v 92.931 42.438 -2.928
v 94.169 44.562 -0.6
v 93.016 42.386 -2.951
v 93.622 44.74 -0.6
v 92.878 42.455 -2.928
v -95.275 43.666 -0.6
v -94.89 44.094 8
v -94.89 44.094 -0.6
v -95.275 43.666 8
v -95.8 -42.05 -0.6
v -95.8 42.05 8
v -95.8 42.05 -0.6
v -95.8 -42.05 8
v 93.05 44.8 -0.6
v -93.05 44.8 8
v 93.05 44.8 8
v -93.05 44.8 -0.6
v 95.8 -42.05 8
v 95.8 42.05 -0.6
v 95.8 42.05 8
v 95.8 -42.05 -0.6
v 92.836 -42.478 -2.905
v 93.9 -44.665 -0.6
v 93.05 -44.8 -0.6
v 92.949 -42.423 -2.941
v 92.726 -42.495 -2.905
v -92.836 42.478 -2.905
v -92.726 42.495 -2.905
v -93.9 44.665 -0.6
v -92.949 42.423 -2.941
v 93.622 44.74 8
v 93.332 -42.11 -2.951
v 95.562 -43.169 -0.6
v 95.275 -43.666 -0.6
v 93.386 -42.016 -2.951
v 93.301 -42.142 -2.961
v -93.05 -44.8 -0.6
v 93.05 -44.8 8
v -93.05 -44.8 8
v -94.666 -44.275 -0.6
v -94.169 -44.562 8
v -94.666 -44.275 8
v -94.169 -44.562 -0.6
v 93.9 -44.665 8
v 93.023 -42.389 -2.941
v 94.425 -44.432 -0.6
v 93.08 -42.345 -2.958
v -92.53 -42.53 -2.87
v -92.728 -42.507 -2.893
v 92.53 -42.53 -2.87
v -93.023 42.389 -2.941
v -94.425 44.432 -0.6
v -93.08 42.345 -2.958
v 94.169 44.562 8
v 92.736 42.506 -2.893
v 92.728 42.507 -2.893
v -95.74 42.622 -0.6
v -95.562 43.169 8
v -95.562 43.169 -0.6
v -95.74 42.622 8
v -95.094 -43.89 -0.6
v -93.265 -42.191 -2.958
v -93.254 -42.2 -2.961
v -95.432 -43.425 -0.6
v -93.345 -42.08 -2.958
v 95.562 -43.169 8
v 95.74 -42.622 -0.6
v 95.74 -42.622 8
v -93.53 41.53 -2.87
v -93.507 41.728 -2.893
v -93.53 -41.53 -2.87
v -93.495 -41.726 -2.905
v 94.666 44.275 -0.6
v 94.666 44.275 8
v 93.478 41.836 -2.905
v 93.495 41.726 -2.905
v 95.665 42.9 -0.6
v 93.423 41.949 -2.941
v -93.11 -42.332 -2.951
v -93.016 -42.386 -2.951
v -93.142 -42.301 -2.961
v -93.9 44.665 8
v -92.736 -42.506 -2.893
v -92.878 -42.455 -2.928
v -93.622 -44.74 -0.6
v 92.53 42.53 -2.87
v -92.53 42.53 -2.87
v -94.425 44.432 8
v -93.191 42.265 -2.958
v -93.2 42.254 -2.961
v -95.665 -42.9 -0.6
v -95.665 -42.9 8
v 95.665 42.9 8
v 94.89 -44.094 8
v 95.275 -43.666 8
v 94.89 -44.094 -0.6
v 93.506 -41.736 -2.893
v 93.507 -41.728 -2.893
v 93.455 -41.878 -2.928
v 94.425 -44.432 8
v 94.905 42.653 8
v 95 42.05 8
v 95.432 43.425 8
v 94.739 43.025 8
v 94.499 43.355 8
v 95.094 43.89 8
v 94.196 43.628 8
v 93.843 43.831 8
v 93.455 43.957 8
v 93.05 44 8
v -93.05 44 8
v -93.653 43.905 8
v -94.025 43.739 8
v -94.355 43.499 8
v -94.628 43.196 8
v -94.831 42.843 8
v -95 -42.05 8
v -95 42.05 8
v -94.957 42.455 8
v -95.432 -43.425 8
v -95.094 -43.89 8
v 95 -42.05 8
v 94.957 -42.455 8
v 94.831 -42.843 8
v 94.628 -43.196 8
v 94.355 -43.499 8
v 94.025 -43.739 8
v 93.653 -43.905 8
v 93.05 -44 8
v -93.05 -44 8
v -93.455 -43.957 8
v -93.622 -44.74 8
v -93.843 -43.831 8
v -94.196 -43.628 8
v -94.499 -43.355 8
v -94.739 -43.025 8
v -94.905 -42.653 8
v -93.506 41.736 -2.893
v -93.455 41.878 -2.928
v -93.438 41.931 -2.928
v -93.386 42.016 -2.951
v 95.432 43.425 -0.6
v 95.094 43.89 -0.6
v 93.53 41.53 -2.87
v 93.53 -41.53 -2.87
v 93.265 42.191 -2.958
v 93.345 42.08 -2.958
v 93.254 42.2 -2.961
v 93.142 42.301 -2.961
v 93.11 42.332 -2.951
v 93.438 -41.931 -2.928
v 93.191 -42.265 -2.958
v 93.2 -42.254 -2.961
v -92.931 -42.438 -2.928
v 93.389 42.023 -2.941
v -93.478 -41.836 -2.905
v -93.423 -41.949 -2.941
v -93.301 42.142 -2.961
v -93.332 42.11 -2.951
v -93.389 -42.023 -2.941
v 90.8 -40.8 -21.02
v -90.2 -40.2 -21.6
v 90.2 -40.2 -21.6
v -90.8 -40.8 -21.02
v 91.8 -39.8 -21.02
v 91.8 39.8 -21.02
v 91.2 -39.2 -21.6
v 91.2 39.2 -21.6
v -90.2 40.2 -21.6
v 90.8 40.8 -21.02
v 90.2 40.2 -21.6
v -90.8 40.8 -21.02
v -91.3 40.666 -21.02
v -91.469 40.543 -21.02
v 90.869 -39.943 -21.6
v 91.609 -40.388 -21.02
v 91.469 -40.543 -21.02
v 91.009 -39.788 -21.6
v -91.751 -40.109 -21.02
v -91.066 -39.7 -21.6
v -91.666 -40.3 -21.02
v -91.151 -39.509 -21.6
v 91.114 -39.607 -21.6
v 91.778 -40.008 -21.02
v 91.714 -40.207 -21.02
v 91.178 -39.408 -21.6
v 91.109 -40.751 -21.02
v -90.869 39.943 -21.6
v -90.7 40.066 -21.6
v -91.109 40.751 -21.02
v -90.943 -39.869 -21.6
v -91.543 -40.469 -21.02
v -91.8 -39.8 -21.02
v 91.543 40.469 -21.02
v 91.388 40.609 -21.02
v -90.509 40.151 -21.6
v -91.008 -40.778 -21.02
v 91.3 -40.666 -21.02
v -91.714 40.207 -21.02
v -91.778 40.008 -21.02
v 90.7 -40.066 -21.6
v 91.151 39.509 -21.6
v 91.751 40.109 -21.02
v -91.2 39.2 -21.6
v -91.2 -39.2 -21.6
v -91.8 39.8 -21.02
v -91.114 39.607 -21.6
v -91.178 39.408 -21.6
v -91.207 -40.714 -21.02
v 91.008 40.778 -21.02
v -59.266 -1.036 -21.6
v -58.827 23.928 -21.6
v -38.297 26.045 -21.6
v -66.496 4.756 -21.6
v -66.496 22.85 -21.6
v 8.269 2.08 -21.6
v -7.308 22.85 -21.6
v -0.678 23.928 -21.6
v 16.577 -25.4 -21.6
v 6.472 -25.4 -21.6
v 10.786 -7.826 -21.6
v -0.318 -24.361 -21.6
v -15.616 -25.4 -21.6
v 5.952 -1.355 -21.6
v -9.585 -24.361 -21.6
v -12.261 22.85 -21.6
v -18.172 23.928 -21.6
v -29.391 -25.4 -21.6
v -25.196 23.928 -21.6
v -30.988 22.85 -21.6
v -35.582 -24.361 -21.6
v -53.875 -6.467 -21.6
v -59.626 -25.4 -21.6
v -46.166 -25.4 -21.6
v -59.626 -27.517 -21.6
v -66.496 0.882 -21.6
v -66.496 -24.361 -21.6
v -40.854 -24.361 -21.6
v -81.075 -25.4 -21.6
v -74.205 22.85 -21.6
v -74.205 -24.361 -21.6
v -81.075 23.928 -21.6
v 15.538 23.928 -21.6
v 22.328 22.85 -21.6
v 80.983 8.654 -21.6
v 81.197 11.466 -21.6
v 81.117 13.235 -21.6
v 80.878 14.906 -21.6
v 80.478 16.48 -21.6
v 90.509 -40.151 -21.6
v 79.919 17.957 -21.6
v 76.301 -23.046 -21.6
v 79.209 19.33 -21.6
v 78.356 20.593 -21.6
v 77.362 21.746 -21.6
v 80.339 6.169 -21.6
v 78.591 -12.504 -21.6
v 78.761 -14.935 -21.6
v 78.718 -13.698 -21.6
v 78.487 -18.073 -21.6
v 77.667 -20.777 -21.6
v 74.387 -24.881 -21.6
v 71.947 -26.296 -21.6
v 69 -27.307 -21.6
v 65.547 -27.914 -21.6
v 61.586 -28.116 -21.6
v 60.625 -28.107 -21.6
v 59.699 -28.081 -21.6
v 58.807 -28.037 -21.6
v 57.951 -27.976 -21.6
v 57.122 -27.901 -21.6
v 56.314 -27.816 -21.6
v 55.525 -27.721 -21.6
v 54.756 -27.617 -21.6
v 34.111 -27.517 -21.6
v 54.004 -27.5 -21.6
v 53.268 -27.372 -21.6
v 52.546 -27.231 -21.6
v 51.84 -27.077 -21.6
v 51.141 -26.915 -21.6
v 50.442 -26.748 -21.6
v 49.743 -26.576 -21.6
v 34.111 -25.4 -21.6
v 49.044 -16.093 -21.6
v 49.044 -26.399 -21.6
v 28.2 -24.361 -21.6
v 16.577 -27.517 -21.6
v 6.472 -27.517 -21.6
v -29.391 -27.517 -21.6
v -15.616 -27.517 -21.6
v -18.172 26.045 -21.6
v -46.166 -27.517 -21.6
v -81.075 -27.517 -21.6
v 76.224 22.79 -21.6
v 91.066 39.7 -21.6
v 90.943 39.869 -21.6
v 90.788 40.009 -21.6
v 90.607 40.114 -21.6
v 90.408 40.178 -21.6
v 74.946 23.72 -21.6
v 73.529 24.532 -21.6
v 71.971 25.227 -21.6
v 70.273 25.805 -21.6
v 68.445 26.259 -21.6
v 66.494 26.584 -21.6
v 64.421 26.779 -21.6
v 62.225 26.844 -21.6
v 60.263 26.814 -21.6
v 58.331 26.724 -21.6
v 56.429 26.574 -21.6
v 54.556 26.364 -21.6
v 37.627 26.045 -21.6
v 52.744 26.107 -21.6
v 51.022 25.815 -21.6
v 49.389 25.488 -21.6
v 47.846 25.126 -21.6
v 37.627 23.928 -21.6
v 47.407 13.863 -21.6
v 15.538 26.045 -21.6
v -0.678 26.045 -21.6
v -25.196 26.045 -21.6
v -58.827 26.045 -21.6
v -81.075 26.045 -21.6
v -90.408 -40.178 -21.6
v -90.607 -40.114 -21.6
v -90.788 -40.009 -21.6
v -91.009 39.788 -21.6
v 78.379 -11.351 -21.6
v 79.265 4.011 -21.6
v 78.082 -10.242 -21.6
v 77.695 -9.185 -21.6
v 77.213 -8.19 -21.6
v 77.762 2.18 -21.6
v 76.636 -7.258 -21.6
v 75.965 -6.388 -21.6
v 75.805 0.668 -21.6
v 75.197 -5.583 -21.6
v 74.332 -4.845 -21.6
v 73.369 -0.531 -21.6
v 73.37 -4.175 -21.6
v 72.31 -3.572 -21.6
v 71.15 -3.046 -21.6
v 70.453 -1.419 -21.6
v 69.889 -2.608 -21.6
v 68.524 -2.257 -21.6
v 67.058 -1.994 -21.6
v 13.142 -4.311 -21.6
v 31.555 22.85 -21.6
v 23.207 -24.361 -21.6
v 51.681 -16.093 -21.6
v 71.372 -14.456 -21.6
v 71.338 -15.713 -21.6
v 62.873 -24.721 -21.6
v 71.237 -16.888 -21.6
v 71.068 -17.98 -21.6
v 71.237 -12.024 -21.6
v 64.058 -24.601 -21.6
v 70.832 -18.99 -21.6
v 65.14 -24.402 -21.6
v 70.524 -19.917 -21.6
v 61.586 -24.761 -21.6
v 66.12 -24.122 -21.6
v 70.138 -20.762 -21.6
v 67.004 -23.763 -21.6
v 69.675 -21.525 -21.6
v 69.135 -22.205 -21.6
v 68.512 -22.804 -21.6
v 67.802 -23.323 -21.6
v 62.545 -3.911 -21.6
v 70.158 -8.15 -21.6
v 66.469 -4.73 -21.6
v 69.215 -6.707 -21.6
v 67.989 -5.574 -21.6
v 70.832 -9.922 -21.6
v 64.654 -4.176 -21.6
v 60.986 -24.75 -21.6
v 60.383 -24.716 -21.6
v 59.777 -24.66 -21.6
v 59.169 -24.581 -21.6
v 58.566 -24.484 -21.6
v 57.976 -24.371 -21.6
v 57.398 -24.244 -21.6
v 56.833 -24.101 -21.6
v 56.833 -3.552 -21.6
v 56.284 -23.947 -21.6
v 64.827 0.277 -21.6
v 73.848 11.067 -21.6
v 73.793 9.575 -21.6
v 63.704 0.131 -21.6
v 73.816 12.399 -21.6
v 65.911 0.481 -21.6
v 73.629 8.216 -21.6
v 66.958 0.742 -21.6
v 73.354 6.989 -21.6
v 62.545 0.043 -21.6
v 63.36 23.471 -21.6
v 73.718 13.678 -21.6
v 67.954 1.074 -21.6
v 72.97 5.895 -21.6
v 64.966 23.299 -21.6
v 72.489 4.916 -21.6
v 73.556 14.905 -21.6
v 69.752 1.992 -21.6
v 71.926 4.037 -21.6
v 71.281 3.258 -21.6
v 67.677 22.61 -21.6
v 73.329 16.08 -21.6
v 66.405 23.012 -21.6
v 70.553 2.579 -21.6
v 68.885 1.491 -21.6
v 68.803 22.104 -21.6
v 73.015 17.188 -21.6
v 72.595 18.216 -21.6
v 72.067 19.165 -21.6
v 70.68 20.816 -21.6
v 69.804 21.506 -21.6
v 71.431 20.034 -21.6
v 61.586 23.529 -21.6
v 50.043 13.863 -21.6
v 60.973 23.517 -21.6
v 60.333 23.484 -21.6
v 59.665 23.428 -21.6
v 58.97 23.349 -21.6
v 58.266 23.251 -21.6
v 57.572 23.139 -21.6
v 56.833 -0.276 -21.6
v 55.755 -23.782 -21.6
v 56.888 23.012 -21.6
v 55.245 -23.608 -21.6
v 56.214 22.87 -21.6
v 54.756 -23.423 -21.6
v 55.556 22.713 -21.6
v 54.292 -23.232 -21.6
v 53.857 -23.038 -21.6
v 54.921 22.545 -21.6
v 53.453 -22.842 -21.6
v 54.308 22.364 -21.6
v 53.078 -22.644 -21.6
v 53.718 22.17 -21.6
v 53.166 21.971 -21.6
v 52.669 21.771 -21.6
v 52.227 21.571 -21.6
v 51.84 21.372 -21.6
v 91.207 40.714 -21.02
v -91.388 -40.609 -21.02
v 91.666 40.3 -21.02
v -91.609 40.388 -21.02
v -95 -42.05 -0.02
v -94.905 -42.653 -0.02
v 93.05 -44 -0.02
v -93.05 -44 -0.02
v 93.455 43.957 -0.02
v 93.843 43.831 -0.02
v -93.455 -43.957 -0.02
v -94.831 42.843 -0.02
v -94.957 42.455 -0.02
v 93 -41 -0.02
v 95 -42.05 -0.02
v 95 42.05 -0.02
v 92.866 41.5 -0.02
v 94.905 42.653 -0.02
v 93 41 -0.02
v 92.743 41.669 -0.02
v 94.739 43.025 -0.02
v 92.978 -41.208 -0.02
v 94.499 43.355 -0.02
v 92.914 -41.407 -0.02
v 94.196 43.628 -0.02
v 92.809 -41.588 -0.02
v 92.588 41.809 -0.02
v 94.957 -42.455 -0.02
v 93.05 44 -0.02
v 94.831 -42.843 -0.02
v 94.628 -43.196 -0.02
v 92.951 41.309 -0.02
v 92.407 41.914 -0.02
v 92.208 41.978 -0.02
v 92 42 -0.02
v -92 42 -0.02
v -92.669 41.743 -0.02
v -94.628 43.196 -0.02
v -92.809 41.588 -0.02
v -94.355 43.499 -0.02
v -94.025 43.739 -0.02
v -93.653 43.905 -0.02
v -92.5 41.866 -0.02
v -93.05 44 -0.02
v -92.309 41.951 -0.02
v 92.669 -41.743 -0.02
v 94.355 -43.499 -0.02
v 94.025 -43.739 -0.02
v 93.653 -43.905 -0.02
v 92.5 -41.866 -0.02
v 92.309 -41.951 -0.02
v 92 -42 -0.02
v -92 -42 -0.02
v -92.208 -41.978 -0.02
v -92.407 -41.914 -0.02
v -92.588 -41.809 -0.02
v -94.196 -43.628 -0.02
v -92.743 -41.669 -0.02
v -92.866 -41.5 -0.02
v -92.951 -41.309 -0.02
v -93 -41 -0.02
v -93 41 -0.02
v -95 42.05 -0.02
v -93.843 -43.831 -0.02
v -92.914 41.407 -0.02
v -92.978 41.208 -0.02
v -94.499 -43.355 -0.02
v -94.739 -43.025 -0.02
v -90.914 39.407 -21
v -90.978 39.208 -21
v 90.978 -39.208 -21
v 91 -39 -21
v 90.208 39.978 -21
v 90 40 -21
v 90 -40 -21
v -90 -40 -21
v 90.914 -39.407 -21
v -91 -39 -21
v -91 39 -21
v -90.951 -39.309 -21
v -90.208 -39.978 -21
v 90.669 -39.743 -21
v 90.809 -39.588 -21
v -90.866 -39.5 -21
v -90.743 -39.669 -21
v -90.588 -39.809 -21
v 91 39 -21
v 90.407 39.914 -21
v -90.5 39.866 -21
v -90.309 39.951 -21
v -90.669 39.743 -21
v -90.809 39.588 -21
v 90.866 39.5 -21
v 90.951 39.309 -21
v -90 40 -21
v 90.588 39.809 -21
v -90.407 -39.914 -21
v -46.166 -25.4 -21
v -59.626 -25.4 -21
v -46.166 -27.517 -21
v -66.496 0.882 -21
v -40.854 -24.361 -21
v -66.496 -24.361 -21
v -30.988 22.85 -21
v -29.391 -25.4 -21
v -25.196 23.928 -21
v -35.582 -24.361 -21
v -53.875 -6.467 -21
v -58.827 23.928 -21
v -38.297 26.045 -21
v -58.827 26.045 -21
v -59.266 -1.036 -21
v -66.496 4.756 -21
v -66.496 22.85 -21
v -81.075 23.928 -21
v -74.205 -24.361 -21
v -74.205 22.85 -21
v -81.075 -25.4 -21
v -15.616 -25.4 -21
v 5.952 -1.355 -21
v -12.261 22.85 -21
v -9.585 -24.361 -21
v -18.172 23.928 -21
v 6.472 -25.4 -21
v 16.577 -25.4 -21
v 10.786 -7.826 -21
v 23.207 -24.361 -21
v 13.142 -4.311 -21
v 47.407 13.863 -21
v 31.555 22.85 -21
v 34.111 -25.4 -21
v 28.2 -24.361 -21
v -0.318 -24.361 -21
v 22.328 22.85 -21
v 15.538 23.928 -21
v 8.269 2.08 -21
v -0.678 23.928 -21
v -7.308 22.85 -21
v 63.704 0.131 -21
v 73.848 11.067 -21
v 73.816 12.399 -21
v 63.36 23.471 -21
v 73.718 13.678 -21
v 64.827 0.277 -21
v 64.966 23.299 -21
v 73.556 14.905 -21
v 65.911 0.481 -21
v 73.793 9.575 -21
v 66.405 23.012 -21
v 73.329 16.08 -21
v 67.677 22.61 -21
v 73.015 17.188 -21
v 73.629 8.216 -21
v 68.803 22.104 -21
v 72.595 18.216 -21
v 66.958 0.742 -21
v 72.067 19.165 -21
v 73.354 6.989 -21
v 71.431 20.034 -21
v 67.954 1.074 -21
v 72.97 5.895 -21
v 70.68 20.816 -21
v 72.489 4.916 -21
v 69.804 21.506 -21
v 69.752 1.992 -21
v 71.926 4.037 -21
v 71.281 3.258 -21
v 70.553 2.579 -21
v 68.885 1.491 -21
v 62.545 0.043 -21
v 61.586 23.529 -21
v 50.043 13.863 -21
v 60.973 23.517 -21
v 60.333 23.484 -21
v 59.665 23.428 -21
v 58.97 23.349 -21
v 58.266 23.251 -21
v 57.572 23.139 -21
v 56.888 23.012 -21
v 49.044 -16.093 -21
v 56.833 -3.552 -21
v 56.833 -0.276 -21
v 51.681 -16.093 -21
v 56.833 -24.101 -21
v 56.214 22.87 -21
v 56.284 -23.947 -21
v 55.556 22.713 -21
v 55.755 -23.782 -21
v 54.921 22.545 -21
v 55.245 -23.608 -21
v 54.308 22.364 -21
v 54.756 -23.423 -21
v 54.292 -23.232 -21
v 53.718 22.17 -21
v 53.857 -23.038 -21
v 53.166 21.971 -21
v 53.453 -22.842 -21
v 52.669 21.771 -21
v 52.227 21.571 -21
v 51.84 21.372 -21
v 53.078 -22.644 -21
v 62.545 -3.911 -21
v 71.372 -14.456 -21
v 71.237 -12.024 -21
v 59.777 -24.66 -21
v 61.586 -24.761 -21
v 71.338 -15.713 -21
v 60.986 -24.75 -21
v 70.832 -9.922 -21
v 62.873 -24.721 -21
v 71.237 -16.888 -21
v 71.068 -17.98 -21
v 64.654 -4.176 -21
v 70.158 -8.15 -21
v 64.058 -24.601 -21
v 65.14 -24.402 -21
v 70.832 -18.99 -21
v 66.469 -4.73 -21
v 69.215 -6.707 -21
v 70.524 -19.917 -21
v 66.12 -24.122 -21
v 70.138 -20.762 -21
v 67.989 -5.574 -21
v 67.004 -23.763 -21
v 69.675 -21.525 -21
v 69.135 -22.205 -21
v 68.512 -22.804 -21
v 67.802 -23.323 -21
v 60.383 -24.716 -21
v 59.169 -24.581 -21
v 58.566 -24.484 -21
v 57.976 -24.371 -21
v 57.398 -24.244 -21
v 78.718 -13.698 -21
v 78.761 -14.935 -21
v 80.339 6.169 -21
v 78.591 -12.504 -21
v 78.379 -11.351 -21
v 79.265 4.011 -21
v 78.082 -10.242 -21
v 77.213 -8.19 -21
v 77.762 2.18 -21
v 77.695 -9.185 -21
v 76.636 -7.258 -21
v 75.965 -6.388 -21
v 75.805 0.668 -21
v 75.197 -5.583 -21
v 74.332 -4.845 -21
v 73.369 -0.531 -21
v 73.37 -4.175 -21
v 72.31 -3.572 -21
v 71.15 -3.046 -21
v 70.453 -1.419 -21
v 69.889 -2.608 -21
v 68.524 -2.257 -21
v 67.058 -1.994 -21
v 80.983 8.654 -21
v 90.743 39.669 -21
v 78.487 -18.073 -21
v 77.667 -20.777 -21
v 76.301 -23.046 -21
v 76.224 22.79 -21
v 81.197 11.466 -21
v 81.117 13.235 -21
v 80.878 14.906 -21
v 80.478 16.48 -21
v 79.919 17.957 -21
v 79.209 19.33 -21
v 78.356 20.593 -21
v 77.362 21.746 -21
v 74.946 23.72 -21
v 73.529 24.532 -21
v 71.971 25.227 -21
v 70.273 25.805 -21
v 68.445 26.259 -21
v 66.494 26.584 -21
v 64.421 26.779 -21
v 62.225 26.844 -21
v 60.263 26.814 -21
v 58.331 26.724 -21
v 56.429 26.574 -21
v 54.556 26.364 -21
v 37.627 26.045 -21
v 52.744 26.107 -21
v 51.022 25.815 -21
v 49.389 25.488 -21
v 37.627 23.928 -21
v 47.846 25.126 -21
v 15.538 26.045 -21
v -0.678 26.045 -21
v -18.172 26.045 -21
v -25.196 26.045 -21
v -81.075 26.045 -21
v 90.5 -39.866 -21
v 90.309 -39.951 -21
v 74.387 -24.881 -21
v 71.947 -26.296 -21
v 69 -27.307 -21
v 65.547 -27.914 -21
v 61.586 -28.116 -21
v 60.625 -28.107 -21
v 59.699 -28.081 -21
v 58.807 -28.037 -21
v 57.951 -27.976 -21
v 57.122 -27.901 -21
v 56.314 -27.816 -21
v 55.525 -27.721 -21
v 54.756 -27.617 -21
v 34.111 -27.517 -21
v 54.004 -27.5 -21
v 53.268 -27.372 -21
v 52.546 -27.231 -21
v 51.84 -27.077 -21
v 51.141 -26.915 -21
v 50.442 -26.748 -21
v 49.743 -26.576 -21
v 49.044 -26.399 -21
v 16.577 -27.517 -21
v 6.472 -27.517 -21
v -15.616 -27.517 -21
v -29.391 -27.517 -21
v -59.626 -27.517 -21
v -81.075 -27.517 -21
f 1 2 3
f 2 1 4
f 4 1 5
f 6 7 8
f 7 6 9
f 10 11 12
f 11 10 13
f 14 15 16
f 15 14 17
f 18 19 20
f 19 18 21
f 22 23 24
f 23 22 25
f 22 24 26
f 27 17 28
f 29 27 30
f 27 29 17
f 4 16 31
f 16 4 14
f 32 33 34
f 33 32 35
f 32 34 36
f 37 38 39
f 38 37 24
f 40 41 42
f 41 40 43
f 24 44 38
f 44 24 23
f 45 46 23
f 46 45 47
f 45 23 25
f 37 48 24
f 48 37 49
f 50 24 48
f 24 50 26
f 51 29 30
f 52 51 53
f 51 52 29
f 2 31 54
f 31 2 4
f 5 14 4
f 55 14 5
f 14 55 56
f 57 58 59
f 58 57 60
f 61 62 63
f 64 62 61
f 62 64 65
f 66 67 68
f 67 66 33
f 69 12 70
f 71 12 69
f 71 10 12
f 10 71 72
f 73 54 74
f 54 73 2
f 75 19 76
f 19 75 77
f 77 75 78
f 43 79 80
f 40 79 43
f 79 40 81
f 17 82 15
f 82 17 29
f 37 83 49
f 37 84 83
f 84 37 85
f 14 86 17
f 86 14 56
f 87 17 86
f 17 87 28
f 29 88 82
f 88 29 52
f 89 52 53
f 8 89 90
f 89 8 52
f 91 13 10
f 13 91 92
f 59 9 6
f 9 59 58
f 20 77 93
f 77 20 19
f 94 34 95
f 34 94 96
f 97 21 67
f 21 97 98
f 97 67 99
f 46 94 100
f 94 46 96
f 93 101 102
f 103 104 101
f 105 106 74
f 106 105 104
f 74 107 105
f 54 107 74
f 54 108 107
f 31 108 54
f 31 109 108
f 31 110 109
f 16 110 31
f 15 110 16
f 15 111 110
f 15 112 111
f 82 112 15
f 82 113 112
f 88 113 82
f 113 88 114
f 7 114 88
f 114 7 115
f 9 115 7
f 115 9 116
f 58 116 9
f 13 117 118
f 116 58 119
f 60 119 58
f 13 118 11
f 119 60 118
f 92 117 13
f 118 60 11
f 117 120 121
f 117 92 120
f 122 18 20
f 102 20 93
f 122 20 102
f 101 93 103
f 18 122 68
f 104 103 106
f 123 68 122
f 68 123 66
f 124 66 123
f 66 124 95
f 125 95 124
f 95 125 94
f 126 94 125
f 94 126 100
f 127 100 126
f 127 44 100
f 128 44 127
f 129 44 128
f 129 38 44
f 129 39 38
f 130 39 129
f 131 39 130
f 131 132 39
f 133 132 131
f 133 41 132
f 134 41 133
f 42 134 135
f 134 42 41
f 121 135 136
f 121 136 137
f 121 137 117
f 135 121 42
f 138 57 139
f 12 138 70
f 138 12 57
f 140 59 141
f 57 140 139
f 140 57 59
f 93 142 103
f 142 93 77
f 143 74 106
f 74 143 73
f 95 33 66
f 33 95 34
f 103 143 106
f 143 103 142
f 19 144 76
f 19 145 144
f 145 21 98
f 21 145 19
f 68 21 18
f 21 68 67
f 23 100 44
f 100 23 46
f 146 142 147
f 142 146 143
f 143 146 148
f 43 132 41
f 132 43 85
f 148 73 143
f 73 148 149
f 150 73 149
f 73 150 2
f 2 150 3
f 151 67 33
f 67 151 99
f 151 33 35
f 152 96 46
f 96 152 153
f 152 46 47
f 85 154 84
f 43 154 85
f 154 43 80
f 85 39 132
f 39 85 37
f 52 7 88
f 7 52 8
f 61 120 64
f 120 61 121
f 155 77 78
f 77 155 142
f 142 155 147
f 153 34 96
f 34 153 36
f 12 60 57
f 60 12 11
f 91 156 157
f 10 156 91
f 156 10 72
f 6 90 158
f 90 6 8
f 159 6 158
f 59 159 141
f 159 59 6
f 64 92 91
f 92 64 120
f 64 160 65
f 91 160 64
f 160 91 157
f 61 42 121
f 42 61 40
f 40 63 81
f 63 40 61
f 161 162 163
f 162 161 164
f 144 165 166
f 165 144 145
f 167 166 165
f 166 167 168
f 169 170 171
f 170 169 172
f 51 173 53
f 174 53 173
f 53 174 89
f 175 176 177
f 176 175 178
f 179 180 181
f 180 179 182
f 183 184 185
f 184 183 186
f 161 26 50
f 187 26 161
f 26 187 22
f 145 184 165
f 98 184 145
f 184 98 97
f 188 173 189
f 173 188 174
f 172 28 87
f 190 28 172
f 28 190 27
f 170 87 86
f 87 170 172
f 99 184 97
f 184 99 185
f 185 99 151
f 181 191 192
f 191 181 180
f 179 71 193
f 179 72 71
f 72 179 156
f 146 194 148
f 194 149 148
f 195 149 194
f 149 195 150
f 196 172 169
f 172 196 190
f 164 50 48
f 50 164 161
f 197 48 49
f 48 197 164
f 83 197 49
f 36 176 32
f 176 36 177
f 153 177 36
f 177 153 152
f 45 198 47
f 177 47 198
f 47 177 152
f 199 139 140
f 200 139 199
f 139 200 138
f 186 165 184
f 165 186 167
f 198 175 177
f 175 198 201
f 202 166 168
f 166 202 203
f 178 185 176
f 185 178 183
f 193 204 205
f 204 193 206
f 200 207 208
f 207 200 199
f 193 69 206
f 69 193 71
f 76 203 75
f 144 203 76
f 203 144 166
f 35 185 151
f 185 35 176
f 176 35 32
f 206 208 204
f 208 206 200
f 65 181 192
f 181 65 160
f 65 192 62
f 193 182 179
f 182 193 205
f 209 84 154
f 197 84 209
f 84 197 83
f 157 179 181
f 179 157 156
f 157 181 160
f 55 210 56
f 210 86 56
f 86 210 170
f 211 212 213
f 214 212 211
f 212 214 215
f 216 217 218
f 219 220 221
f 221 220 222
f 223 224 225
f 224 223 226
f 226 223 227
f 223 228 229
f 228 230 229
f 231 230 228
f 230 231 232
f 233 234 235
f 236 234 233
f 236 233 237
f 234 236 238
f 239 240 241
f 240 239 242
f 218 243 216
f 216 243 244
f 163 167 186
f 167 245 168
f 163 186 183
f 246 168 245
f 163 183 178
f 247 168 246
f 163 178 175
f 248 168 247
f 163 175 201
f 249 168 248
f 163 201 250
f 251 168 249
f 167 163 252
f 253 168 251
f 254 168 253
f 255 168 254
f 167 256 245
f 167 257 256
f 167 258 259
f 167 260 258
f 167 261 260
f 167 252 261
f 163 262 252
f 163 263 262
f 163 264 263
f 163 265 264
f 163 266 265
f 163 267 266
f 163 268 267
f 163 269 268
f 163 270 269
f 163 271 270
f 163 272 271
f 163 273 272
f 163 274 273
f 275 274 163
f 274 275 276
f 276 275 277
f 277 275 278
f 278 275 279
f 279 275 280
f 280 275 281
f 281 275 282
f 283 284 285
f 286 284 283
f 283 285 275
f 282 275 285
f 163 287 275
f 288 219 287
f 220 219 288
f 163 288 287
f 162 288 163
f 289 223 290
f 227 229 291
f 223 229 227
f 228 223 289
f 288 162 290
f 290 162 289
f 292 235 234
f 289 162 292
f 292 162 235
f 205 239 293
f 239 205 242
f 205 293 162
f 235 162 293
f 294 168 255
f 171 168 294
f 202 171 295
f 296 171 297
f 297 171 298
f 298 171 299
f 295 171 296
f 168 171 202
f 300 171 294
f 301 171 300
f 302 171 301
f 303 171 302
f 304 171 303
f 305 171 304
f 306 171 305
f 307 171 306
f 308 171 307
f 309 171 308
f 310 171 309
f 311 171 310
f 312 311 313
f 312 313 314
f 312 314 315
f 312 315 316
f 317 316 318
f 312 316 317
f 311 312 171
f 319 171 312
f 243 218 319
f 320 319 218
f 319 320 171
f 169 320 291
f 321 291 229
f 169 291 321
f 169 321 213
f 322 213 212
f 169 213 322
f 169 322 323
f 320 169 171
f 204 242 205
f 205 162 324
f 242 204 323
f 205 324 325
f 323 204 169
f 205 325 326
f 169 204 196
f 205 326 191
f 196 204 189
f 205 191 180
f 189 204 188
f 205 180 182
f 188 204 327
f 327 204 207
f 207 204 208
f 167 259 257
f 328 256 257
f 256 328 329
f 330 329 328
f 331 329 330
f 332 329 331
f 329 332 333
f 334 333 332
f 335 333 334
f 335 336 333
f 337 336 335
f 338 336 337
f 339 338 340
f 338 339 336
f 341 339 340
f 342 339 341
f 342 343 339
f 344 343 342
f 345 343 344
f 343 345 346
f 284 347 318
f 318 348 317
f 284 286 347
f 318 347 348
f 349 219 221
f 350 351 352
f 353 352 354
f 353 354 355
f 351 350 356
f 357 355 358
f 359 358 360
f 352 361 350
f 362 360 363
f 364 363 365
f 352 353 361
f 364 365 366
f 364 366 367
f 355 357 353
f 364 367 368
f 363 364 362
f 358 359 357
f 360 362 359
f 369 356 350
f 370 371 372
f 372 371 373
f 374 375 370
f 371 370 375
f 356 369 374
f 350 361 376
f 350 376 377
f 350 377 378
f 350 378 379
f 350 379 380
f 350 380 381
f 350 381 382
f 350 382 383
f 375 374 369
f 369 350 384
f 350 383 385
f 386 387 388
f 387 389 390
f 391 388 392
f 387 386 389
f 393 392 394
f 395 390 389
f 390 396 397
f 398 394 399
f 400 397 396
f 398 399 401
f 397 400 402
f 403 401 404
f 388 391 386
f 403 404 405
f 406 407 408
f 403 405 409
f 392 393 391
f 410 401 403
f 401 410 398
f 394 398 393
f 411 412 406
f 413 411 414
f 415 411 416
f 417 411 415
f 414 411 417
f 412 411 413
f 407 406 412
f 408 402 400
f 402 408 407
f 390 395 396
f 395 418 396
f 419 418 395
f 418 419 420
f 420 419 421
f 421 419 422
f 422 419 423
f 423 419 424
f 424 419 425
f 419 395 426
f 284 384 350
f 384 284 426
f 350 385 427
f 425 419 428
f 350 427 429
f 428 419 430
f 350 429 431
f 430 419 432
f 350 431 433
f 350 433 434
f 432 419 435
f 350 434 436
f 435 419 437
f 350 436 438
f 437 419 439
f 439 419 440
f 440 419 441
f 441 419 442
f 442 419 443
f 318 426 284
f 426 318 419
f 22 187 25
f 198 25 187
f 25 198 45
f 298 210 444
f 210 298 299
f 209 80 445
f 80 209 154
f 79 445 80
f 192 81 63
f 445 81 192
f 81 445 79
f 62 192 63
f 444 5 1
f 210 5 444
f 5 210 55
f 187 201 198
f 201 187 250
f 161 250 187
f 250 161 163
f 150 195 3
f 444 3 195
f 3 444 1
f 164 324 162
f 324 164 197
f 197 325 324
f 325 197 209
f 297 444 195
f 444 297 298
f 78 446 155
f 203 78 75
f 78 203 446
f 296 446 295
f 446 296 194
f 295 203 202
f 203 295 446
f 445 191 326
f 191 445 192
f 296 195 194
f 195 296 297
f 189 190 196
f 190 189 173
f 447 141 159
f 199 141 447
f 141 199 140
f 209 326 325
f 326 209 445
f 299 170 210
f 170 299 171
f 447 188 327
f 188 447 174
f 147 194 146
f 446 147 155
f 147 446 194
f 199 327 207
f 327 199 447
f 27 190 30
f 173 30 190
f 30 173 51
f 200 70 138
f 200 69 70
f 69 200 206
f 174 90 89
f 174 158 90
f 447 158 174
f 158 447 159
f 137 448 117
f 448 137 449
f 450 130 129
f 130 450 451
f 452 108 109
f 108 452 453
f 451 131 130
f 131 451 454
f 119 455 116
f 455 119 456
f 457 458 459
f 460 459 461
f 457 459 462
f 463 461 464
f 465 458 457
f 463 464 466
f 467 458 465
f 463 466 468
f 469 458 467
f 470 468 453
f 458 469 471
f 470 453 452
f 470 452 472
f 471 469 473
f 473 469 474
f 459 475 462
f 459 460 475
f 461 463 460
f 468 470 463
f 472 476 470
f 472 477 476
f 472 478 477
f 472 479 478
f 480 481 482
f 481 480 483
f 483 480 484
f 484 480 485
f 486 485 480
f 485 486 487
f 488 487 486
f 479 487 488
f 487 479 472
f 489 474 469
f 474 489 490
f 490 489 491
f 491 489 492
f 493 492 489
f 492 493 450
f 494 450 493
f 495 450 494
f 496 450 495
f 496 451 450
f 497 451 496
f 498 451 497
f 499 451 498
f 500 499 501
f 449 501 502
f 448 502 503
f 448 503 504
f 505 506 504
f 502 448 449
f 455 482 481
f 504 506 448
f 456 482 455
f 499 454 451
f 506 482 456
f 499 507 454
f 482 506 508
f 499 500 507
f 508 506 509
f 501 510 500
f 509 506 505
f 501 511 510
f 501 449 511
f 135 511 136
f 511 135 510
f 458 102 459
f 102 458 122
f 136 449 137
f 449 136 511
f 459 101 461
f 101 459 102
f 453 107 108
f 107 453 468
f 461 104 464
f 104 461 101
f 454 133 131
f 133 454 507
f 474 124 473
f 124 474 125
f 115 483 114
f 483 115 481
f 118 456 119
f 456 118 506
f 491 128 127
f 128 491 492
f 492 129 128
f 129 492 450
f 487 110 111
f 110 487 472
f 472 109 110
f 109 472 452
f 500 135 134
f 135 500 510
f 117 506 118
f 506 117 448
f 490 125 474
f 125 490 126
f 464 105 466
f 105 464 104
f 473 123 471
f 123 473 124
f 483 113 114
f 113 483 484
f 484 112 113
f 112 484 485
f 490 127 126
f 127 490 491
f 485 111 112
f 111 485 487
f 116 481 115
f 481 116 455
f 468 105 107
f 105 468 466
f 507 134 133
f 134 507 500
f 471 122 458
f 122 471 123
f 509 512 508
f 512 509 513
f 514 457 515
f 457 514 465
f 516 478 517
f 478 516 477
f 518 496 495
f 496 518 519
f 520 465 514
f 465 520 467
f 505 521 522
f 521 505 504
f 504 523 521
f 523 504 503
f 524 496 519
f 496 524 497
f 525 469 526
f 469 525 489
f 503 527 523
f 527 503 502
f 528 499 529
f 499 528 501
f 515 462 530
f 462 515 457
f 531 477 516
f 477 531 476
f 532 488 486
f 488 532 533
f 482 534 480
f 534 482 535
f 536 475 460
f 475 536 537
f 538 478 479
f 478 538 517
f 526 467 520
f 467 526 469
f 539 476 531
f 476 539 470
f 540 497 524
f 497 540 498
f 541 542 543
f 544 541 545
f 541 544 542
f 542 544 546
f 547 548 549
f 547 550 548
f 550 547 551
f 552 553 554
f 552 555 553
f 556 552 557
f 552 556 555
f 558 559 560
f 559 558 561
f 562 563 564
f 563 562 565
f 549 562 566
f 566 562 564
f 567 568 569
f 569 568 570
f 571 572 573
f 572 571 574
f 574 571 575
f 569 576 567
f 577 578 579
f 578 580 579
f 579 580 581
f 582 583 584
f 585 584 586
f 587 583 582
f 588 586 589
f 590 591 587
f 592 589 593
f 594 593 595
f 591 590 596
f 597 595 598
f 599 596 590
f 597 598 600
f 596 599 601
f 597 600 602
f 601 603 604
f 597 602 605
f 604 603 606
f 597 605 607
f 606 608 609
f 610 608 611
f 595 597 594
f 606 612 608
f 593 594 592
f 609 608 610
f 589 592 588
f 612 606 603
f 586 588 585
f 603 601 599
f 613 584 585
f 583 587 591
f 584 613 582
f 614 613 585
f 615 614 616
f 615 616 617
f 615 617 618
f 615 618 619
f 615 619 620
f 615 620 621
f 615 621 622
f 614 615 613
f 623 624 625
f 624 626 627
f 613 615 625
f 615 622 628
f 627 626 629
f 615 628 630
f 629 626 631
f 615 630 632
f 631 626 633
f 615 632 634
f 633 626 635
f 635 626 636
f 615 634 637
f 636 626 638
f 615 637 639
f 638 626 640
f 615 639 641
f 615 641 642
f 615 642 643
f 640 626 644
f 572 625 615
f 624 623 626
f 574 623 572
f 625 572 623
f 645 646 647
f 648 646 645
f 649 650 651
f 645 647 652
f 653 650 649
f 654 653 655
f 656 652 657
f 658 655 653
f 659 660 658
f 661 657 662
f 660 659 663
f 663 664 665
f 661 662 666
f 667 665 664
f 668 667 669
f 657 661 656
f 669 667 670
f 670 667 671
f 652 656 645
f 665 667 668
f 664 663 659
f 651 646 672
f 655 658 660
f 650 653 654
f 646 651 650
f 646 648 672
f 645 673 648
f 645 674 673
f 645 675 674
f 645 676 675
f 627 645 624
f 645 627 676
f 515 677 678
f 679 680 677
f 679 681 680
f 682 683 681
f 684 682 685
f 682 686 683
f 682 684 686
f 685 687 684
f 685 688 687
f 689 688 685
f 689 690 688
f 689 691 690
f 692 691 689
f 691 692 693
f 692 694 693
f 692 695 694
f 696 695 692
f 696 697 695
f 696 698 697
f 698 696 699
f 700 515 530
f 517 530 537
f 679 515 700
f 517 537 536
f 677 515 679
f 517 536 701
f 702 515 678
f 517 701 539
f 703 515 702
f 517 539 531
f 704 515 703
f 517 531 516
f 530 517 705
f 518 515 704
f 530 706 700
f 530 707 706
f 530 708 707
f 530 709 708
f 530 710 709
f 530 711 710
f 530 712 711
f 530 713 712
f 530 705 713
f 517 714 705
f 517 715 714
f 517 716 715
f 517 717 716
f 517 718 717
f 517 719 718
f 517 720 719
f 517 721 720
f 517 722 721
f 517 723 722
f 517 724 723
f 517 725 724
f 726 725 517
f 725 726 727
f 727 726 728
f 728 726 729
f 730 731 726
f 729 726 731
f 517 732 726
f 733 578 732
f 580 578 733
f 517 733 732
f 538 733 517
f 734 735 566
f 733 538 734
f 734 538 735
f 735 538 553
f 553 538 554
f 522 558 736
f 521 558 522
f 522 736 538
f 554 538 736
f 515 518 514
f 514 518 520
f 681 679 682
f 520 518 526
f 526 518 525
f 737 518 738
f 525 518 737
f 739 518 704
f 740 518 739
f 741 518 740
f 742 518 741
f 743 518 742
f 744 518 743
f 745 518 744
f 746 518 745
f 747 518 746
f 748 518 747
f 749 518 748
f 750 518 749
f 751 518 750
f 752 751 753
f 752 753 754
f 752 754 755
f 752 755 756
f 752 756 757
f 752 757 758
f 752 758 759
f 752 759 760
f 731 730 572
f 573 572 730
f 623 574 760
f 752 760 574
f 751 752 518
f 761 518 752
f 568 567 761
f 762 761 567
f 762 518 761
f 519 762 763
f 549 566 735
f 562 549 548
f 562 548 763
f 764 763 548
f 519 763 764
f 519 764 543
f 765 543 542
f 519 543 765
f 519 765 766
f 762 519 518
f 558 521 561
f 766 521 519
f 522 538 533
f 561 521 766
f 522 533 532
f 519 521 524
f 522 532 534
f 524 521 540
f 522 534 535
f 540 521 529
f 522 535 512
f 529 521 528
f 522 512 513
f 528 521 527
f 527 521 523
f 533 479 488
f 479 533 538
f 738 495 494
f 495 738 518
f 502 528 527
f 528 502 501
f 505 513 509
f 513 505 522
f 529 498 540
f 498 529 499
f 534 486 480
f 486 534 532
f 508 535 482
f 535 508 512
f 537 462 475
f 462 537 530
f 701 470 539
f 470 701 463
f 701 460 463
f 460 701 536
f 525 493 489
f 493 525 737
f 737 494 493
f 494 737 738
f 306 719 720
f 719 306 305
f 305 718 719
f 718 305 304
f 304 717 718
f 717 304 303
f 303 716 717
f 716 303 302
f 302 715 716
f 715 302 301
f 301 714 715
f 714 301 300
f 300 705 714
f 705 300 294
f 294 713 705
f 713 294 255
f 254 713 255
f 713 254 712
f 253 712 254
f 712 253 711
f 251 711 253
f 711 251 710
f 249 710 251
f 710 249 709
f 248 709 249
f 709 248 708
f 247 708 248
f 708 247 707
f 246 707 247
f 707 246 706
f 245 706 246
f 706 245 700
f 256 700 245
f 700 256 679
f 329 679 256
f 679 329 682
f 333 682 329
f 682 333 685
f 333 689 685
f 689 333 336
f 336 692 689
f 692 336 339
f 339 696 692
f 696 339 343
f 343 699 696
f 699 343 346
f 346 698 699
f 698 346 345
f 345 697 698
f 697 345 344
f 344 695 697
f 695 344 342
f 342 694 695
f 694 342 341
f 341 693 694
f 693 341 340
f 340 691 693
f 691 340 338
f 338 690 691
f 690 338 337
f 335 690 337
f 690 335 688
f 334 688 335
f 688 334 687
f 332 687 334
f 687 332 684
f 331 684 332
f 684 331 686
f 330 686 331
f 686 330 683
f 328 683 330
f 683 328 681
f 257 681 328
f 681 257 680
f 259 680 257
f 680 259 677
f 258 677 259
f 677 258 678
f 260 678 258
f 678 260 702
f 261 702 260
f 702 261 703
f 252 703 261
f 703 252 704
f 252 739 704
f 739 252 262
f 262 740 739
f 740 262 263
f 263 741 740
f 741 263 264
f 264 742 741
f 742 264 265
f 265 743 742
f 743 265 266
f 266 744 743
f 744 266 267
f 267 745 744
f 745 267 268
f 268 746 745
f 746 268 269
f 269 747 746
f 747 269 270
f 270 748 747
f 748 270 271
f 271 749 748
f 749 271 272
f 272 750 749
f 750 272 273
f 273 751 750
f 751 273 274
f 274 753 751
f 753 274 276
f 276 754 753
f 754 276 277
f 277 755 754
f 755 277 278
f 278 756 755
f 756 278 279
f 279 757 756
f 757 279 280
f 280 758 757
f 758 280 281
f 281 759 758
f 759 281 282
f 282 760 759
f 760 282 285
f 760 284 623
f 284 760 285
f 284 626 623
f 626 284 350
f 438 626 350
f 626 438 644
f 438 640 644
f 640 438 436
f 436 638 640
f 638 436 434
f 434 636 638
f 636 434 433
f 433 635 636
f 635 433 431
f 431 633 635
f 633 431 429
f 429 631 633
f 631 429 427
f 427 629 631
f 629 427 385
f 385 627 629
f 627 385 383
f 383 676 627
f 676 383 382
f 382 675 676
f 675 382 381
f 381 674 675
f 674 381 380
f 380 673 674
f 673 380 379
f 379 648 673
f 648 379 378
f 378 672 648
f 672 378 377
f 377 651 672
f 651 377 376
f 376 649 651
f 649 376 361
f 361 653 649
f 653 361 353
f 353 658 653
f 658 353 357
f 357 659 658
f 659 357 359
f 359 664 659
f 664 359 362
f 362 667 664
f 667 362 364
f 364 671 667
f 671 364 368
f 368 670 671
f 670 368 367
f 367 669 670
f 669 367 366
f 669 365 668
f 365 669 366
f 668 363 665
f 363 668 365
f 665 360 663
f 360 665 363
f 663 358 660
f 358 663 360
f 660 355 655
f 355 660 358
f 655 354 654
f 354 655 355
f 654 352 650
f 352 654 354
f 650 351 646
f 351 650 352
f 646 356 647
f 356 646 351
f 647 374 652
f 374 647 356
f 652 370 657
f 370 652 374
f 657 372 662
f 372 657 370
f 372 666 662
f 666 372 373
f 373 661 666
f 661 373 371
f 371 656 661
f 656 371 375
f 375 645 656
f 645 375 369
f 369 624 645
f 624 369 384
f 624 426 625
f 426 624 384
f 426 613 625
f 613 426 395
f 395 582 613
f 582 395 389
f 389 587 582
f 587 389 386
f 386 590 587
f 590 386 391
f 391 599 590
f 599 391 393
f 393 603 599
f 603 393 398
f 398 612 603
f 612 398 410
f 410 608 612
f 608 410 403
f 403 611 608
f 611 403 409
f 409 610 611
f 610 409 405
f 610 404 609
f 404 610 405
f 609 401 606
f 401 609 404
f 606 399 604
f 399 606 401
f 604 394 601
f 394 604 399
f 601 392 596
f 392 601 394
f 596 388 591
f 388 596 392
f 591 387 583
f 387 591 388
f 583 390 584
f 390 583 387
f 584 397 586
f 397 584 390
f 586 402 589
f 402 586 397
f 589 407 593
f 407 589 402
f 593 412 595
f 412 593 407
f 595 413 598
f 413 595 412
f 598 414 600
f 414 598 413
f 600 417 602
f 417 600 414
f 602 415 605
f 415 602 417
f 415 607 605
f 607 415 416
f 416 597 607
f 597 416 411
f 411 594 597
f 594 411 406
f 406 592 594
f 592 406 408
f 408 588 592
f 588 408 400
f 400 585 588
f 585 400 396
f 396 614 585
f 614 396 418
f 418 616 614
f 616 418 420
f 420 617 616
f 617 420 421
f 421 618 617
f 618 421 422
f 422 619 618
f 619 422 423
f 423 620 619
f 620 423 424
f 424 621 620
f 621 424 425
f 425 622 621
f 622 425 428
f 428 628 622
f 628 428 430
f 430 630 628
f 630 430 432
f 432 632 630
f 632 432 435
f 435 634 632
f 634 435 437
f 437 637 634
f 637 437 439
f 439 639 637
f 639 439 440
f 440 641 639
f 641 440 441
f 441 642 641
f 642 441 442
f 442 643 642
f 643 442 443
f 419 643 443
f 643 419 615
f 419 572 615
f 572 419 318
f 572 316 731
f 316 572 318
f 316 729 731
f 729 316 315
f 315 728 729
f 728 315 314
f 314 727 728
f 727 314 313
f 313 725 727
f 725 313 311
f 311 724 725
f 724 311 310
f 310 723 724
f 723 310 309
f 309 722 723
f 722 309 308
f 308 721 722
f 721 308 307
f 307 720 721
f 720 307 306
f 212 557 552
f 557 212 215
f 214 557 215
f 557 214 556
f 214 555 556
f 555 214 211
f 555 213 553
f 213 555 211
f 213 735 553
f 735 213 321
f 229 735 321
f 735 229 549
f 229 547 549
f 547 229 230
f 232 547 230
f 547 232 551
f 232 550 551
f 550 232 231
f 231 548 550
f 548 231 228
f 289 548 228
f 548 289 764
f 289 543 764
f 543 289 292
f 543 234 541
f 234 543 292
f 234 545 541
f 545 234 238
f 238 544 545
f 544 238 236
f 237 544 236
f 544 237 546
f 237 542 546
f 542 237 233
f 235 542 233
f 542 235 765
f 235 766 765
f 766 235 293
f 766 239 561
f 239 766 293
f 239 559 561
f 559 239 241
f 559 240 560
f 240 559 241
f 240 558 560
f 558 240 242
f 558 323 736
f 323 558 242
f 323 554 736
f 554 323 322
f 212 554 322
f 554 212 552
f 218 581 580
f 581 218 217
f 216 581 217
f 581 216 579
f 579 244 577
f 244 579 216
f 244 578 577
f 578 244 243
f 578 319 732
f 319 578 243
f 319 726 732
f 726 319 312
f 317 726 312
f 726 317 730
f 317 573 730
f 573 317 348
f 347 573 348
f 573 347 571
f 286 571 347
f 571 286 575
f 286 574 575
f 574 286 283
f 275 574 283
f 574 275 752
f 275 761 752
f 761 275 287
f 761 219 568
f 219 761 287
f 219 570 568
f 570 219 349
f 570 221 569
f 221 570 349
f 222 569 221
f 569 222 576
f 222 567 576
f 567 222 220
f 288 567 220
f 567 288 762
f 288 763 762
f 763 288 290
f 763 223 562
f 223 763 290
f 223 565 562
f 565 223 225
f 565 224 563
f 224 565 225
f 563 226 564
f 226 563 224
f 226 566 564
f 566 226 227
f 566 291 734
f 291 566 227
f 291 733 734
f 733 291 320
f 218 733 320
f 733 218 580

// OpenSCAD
// file: kx3-dust-cover.scad
// Measured parameters
kx3_width = 190;
kx3_height = 88;
kx3_corner_rounding_radius = 1.95;

// Constrained but not maximized parameters
horizontal_inward_clearance_bottom = 2;  // max 3 for VFO knob base
horizontal_inward_clearance_top = 4;
vertical_side_jack_clearance = 8;  // max 9 or so depending on accessory plug diameter
panel_control_clearance_height = 21;

// Chosen parameters
vertical_wall_thickness = 0.8;
horizontal_wall_thickness = 0.6;  // three layers to ensure good fusion of the logo
epsilon = 0.02;
$with_label_cut=false;


printable();


module printable() {
    rotate([180, 0, 0]) main();
}

module preview() {
    difference() {
        main();
        translate([0, 0, -500])
        cube([1000, 1000, 1000]);
    }
}

module main() {
    difference() {
        exterior_volume();
        interior_volume();
        
        if ($with_label_cut)
        label_cut();
    }
}

module label_cut() {
    // Times appears to be the font used for the Elecraft and KX3 branding (in small-caps)
    translate([2 /* fudge */, 0, panel_control_clearance_height - epsilon])
    linear_extrude(horizontal_wall_thickness * 2)
    text("KX3", spacing=1.1, size=kx3_width * 0.31, font="Times", halign="center", valign="center");
}

module interior_volume() {
    // Rim
    mirror([0, 0, 1])
    translate([0, 0, -epsilon])
    linear_extrude(vertical_side_jack_clearance + epsilon * 2)
    offset(r=kx3_corner_rounding_radius, $fn=30)
    offset(delta=-kx3_corner_rounding_radius)
    square([kx3_width, kx3_height], center=true);
    
    // Volume for panel controls
    panel_clearance_volume();
}

module exterior_volume() {
    // Rim
    mirror([0, 0, 1])
    translate([0, 0, -horizontal_wall_thickness])
    hull() {
        rim_outer_radius = kx3_corner_rounding_radius + vertical_wall_thickness;
        linear_extrude(vertical_side_jack_clearance + horizontal_wall_thickness)
        corner_round(rim_outer_radius)
        rim_2d();
        
        // create 45° overhang support
        // Precise form of this would be matching the slope of the horizontal clearance but that would be a line intersection problem, so fudge it.
        overhang_inset = horizontal_inward_clearance_bottom * 1.6;
        translate([0, 0, -overhang_inset])
        linear_extrude(epsilon)
        offset(delta=-overhang_inset)
        rim_2d();
    }
    
    // Volume for panel controls
    minkowski() {
        // Shape for top bevel and side walls — a pyramid
        hull() {
            linear_extrude(epsilon)
            square([1, 1] * vertical_wall_thickness * 2, center=true);

            // 45° chamfered top
            chamfer = horizontal_wall_thickness;
            linear_extrude(chamfer)
            offset(delta=-chamfer)
            square([1, 1] * vertical_wall_thickness * 2, center=true);
        }
        panel_clearance_volume();
    }
    
    module panel_2d() {
        square([
            kx3_width - horizontal_inward_clearance_bottom * 2 + vertical_wall_thickness * 2, 
            kx3_height - horizontal_inward_clearance_bottom * 2 + vertical_wall_thickness * 2
        ], center=true);
    }
    
    module rim_2d() {
        square([kx3_width + vertical_wall_thickness * 2, kx3_height + vertical_wall_thickness * 2], center=true);
    }
}

module panel_clearance_volume() {
    hull() {
        // bottom
        linear_extrude(epsilon)
        corner_round(1)
        square([
            kx3_width - horizontal_inward_clearance_bottom * 2,
            kx3_height - horizontal_inward_clearance_bottom * 2,
        ], center=true);

        // top (bottom as printed)
        translate([0, 0, panel_control_clearance_height])
        mirror([0, 0, 1])
        linear_extrude(epsilon)
        corner_round(1)
        square([
            kx3_width - horizontal_inward_clearance_top * 2,
            kx3_height - horizontal_inward_clearance_top * 2,
        ], center=true);
    }
}

module corner_round(r) {
    offset(r=r, $fn=30)
    offset(delta=-r)
    children();
}
// main file
use <kx3-dust-cover.scad>


printable($with_label_cut=true);
